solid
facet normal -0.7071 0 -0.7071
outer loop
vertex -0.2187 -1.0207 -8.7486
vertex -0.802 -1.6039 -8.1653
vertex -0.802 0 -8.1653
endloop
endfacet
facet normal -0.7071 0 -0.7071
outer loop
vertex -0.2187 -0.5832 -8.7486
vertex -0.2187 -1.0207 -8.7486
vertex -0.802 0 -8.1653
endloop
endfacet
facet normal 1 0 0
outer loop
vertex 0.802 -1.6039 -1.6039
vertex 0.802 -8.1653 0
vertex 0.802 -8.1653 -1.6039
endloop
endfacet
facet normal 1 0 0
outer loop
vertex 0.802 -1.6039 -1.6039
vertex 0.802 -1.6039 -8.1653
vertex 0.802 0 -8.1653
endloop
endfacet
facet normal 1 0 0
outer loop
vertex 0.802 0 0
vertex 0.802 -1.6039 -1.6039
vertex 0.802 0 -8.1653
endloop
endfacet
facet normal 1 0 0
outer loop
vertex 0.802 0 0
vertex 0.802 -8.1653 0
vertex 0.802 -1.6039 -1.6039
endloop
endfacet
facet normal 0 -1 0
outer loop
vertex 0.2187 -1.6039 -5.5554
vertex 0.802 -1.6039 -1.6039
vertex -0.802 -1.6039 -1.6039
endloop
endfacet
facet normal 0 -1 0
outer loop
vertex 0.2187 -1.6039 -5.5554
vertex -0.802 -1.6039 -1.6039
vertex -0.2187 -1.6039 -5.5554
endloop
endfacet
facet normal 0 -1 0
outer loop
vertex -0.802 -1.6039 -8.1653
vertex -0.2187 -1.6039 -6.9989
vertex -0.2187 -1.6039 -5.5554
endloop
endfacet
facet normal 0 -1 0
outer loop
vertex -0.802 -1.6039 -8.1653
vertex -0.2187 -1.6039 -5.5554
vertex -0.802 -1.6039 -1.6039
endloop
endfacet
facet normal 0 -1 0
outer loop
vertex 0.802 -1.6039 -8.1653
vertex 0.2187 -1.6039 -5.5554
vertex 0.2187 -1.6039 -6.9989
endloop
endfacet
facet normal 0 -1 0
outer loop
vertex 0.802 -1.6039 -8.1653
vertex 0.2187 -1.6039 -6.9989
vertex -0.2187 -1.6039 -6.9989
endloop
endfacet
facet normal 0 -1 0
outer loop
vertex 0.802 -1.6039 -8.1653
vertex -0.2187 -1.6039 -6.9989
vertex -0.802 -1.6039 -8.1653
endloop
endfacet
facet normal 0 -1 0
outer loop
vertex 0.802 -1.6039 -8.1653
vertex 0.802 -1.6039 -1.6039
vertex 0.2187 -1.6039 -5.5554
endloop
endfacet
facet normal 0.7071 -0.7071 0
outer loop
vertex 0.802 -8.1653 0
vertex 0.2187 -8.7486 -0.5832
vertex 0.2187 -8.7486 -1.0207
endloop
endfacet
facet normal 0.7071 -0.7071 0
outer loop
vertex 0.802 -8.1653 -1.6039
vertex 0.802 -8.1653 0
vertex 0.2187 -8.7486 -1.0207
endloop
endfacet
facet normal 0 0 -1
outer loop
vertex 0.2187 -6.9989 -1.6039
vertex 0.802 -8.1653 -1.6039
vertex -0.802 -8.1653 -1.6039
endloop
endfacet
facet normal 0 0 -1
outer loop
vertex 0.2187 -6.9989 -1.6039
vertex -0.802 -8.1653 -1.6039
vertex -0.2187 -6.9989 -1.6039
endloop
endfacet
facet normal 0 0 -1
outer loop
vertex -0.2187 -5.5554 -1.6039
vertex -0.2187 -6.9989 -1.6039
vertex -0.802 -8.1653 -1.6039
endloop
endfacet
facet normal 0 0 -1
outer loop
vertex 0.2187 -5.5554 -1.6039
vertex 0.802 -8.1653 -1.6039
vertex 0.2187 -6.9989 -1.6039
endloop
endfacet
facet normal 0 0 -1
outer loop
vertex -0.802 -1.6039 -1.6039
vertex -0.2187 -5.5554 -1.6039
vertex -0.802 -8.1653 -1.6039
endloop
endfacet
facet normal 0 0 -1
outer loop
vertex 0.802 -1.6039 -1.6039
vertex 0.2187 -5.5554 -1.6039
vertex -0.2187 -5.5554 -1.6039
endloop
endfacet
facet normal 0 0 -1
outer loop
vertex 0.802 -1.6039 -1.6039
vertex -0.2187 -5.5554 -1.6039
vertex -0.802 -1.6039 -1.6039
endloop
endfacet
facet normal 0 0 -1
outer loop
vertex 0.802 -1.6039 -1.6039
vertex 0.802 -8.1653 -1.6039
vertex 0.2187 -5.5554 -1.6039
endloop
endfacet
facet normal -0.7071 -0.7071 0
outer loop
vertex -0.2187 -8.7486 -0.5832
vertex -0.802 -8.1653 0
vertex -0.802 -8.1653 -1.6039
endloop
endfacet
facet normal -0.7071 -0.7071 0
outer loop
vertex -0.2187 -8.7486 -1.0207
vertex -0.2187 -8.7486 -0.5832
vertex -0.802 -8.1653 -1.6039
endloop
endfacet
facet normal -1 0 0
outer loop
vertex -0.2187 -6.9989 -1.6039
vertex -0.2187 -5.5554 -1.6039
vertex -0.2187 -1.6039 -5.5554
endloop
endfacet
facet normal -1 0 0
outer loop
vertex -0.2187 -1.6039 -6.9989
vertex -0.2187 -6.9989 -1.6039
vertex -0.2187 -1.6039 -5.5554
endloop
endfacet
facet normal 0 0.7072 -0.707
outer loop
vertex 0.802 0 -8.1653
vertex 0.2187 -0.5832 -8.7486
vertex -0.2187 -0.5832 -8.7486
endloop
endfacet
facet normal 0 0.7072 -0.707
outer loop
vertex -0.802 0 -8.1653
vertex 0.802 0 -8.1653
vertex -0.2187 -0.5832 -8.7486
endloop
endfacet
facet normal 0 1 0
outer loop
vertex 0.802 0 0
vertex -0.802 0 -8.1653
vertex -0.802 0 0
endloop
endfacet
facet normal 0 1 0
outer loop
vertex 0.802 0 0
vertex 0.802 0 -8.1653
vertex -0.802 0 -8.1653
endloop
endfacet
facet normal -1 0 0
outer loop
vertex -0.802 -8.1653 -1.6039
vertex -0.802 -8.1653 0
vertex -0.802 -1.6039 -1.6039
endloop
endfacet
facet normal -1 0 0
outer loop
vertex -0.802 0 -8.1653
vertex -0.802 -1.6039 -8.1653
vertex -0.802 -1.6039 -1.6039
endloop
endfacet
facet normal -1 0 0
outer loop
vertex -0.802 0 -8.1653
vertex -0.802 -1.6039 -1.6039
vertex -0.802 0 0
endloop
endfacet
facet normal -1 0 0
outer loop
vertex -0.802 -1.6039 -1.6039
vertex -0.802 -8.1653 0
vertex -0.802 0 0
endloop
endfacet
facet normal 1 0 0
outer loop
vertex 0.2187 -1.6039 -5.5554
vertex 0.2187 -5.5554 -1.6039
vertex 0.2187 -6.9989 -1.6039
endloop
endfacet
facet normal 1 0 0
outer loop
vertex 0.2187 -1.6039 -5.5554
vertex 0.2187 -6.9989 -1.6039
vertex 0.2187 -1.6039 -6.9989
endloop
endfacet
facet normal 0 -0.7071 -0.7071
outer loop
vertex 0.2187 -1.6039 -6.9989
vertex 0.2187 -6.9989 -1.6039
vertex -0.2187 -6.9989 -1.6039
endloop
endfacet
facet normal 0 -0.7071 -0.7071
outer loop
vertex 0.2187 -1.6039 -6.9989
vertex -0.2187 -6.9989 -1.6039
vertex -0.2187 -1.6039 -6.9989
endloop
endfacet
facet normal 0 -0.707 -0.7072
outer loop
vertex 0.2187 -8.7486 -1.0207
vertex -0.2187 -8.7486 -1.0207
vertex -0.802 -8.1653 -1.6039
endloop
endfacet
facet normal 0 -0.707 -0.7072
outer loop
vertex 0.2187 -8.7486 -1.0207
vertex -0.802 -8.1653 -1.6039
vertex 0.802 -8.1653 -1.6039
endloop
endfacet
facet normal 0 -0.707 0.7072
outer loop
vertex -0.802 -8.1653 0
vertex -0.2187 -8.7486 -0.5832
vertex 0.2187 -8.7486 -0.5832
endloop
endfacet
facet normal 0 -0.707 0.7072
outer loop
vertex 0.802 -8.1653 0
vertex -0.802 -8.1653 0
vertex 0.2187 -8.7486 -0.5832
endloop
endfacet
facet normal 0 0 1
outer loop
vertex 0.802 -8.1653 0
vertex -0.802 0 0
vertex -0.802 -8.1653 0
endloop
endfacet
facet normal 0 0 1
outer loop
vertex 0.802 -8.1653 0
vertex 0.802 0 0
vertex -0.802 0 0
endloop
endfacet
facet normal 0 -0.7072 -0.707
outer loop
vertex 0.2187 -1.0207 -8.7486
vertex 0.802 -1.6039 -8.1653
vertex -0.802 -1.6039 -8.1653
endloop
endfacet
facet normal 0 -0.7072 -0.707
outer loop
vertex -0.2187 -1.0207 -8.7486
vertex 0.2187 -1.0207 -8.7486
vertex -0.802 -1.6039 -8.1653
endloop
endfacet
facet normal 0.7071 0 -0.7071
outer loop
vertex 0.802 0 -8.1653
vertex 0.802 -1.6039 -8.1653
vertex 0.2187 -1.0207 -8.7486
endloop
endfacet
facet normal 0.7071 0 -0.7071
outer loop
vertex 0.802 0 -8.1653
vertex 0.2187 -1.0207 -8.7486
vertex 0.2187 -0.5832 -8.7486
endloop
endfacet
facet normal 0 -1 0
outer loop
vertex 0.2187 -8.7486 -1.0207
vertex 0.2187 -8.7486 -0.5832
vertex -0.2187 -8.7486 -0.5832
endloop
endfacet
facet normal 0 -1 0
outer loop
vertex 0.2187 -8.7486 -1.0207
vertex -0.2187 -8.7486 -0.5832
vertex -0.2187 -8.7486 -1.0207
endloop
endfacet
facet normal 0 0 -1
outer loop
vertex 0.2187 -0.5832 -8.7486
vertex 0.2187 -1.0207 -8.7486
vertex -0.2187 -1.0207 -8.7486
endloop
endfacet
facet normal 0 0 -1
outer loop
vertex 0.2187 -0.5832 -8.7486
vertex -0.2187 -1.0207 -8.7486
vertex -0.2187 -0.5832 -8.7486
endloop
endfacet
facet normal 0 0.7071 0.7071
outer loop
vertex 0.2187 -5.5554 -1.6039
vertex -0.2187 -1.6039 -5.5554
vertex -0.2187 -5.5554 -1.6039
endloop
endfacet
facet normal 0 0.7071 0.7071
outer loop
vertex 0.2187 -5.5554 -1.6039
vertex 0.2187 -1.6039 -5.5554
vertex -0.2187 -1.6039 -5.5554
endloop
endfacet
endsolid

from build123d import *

# Parameters (mm, degrees)
F1_DEPTH = 69.85
F2_SIZE2 = 50.8
F2_SIZE  = 50.8
F4_DEPTH = 19.05
F5_SCALE = 0.0114810563


with BuildPart() as f1:
    # F0 (on Right) → F1 (new body, symmetric)
    with BuildSketch(Plane.YZ):
        Polygon((0, 0), (-762, 0), (-762, -139.7), (-139.7, -139.7), (-139.7, -762), (0, -762), align=None)
    extrude(amount=F1_DEPTH, both=True)

    # F2
    f2_edges = [f1.edges().sort_by_distance(p)[0] for p in [
        (0, -762, -139.7),
        (69.85, -69.85, -762),
        (0, -139.7, -762),
        (-69.85, -69.85, -762),
        (0, 0, -762),
        (-69.85, -762, -69.85),
        (0, -762, 0),
        (69.85, -762, -69.85),
    ]]
    chamfer(f2_edges, length=F2_SIZE, length2=F2_SIZE2)

    # F3 (on Right) → F4 (join, symmetric)
    with BuildSketch(Plane.YZ):
        Polygon((-483.876414305, -139.7), (-609.6, -139.7), (-139.7, -609.6), (-139.7, -483.876414305), align=None)
    extrude(amount=F4_DEPTH, both=True)


with BuildPart() as f1_1:
    # F5: moved
    add(f1.part.scale(F5_SCALE))


solid = f1_1.part
